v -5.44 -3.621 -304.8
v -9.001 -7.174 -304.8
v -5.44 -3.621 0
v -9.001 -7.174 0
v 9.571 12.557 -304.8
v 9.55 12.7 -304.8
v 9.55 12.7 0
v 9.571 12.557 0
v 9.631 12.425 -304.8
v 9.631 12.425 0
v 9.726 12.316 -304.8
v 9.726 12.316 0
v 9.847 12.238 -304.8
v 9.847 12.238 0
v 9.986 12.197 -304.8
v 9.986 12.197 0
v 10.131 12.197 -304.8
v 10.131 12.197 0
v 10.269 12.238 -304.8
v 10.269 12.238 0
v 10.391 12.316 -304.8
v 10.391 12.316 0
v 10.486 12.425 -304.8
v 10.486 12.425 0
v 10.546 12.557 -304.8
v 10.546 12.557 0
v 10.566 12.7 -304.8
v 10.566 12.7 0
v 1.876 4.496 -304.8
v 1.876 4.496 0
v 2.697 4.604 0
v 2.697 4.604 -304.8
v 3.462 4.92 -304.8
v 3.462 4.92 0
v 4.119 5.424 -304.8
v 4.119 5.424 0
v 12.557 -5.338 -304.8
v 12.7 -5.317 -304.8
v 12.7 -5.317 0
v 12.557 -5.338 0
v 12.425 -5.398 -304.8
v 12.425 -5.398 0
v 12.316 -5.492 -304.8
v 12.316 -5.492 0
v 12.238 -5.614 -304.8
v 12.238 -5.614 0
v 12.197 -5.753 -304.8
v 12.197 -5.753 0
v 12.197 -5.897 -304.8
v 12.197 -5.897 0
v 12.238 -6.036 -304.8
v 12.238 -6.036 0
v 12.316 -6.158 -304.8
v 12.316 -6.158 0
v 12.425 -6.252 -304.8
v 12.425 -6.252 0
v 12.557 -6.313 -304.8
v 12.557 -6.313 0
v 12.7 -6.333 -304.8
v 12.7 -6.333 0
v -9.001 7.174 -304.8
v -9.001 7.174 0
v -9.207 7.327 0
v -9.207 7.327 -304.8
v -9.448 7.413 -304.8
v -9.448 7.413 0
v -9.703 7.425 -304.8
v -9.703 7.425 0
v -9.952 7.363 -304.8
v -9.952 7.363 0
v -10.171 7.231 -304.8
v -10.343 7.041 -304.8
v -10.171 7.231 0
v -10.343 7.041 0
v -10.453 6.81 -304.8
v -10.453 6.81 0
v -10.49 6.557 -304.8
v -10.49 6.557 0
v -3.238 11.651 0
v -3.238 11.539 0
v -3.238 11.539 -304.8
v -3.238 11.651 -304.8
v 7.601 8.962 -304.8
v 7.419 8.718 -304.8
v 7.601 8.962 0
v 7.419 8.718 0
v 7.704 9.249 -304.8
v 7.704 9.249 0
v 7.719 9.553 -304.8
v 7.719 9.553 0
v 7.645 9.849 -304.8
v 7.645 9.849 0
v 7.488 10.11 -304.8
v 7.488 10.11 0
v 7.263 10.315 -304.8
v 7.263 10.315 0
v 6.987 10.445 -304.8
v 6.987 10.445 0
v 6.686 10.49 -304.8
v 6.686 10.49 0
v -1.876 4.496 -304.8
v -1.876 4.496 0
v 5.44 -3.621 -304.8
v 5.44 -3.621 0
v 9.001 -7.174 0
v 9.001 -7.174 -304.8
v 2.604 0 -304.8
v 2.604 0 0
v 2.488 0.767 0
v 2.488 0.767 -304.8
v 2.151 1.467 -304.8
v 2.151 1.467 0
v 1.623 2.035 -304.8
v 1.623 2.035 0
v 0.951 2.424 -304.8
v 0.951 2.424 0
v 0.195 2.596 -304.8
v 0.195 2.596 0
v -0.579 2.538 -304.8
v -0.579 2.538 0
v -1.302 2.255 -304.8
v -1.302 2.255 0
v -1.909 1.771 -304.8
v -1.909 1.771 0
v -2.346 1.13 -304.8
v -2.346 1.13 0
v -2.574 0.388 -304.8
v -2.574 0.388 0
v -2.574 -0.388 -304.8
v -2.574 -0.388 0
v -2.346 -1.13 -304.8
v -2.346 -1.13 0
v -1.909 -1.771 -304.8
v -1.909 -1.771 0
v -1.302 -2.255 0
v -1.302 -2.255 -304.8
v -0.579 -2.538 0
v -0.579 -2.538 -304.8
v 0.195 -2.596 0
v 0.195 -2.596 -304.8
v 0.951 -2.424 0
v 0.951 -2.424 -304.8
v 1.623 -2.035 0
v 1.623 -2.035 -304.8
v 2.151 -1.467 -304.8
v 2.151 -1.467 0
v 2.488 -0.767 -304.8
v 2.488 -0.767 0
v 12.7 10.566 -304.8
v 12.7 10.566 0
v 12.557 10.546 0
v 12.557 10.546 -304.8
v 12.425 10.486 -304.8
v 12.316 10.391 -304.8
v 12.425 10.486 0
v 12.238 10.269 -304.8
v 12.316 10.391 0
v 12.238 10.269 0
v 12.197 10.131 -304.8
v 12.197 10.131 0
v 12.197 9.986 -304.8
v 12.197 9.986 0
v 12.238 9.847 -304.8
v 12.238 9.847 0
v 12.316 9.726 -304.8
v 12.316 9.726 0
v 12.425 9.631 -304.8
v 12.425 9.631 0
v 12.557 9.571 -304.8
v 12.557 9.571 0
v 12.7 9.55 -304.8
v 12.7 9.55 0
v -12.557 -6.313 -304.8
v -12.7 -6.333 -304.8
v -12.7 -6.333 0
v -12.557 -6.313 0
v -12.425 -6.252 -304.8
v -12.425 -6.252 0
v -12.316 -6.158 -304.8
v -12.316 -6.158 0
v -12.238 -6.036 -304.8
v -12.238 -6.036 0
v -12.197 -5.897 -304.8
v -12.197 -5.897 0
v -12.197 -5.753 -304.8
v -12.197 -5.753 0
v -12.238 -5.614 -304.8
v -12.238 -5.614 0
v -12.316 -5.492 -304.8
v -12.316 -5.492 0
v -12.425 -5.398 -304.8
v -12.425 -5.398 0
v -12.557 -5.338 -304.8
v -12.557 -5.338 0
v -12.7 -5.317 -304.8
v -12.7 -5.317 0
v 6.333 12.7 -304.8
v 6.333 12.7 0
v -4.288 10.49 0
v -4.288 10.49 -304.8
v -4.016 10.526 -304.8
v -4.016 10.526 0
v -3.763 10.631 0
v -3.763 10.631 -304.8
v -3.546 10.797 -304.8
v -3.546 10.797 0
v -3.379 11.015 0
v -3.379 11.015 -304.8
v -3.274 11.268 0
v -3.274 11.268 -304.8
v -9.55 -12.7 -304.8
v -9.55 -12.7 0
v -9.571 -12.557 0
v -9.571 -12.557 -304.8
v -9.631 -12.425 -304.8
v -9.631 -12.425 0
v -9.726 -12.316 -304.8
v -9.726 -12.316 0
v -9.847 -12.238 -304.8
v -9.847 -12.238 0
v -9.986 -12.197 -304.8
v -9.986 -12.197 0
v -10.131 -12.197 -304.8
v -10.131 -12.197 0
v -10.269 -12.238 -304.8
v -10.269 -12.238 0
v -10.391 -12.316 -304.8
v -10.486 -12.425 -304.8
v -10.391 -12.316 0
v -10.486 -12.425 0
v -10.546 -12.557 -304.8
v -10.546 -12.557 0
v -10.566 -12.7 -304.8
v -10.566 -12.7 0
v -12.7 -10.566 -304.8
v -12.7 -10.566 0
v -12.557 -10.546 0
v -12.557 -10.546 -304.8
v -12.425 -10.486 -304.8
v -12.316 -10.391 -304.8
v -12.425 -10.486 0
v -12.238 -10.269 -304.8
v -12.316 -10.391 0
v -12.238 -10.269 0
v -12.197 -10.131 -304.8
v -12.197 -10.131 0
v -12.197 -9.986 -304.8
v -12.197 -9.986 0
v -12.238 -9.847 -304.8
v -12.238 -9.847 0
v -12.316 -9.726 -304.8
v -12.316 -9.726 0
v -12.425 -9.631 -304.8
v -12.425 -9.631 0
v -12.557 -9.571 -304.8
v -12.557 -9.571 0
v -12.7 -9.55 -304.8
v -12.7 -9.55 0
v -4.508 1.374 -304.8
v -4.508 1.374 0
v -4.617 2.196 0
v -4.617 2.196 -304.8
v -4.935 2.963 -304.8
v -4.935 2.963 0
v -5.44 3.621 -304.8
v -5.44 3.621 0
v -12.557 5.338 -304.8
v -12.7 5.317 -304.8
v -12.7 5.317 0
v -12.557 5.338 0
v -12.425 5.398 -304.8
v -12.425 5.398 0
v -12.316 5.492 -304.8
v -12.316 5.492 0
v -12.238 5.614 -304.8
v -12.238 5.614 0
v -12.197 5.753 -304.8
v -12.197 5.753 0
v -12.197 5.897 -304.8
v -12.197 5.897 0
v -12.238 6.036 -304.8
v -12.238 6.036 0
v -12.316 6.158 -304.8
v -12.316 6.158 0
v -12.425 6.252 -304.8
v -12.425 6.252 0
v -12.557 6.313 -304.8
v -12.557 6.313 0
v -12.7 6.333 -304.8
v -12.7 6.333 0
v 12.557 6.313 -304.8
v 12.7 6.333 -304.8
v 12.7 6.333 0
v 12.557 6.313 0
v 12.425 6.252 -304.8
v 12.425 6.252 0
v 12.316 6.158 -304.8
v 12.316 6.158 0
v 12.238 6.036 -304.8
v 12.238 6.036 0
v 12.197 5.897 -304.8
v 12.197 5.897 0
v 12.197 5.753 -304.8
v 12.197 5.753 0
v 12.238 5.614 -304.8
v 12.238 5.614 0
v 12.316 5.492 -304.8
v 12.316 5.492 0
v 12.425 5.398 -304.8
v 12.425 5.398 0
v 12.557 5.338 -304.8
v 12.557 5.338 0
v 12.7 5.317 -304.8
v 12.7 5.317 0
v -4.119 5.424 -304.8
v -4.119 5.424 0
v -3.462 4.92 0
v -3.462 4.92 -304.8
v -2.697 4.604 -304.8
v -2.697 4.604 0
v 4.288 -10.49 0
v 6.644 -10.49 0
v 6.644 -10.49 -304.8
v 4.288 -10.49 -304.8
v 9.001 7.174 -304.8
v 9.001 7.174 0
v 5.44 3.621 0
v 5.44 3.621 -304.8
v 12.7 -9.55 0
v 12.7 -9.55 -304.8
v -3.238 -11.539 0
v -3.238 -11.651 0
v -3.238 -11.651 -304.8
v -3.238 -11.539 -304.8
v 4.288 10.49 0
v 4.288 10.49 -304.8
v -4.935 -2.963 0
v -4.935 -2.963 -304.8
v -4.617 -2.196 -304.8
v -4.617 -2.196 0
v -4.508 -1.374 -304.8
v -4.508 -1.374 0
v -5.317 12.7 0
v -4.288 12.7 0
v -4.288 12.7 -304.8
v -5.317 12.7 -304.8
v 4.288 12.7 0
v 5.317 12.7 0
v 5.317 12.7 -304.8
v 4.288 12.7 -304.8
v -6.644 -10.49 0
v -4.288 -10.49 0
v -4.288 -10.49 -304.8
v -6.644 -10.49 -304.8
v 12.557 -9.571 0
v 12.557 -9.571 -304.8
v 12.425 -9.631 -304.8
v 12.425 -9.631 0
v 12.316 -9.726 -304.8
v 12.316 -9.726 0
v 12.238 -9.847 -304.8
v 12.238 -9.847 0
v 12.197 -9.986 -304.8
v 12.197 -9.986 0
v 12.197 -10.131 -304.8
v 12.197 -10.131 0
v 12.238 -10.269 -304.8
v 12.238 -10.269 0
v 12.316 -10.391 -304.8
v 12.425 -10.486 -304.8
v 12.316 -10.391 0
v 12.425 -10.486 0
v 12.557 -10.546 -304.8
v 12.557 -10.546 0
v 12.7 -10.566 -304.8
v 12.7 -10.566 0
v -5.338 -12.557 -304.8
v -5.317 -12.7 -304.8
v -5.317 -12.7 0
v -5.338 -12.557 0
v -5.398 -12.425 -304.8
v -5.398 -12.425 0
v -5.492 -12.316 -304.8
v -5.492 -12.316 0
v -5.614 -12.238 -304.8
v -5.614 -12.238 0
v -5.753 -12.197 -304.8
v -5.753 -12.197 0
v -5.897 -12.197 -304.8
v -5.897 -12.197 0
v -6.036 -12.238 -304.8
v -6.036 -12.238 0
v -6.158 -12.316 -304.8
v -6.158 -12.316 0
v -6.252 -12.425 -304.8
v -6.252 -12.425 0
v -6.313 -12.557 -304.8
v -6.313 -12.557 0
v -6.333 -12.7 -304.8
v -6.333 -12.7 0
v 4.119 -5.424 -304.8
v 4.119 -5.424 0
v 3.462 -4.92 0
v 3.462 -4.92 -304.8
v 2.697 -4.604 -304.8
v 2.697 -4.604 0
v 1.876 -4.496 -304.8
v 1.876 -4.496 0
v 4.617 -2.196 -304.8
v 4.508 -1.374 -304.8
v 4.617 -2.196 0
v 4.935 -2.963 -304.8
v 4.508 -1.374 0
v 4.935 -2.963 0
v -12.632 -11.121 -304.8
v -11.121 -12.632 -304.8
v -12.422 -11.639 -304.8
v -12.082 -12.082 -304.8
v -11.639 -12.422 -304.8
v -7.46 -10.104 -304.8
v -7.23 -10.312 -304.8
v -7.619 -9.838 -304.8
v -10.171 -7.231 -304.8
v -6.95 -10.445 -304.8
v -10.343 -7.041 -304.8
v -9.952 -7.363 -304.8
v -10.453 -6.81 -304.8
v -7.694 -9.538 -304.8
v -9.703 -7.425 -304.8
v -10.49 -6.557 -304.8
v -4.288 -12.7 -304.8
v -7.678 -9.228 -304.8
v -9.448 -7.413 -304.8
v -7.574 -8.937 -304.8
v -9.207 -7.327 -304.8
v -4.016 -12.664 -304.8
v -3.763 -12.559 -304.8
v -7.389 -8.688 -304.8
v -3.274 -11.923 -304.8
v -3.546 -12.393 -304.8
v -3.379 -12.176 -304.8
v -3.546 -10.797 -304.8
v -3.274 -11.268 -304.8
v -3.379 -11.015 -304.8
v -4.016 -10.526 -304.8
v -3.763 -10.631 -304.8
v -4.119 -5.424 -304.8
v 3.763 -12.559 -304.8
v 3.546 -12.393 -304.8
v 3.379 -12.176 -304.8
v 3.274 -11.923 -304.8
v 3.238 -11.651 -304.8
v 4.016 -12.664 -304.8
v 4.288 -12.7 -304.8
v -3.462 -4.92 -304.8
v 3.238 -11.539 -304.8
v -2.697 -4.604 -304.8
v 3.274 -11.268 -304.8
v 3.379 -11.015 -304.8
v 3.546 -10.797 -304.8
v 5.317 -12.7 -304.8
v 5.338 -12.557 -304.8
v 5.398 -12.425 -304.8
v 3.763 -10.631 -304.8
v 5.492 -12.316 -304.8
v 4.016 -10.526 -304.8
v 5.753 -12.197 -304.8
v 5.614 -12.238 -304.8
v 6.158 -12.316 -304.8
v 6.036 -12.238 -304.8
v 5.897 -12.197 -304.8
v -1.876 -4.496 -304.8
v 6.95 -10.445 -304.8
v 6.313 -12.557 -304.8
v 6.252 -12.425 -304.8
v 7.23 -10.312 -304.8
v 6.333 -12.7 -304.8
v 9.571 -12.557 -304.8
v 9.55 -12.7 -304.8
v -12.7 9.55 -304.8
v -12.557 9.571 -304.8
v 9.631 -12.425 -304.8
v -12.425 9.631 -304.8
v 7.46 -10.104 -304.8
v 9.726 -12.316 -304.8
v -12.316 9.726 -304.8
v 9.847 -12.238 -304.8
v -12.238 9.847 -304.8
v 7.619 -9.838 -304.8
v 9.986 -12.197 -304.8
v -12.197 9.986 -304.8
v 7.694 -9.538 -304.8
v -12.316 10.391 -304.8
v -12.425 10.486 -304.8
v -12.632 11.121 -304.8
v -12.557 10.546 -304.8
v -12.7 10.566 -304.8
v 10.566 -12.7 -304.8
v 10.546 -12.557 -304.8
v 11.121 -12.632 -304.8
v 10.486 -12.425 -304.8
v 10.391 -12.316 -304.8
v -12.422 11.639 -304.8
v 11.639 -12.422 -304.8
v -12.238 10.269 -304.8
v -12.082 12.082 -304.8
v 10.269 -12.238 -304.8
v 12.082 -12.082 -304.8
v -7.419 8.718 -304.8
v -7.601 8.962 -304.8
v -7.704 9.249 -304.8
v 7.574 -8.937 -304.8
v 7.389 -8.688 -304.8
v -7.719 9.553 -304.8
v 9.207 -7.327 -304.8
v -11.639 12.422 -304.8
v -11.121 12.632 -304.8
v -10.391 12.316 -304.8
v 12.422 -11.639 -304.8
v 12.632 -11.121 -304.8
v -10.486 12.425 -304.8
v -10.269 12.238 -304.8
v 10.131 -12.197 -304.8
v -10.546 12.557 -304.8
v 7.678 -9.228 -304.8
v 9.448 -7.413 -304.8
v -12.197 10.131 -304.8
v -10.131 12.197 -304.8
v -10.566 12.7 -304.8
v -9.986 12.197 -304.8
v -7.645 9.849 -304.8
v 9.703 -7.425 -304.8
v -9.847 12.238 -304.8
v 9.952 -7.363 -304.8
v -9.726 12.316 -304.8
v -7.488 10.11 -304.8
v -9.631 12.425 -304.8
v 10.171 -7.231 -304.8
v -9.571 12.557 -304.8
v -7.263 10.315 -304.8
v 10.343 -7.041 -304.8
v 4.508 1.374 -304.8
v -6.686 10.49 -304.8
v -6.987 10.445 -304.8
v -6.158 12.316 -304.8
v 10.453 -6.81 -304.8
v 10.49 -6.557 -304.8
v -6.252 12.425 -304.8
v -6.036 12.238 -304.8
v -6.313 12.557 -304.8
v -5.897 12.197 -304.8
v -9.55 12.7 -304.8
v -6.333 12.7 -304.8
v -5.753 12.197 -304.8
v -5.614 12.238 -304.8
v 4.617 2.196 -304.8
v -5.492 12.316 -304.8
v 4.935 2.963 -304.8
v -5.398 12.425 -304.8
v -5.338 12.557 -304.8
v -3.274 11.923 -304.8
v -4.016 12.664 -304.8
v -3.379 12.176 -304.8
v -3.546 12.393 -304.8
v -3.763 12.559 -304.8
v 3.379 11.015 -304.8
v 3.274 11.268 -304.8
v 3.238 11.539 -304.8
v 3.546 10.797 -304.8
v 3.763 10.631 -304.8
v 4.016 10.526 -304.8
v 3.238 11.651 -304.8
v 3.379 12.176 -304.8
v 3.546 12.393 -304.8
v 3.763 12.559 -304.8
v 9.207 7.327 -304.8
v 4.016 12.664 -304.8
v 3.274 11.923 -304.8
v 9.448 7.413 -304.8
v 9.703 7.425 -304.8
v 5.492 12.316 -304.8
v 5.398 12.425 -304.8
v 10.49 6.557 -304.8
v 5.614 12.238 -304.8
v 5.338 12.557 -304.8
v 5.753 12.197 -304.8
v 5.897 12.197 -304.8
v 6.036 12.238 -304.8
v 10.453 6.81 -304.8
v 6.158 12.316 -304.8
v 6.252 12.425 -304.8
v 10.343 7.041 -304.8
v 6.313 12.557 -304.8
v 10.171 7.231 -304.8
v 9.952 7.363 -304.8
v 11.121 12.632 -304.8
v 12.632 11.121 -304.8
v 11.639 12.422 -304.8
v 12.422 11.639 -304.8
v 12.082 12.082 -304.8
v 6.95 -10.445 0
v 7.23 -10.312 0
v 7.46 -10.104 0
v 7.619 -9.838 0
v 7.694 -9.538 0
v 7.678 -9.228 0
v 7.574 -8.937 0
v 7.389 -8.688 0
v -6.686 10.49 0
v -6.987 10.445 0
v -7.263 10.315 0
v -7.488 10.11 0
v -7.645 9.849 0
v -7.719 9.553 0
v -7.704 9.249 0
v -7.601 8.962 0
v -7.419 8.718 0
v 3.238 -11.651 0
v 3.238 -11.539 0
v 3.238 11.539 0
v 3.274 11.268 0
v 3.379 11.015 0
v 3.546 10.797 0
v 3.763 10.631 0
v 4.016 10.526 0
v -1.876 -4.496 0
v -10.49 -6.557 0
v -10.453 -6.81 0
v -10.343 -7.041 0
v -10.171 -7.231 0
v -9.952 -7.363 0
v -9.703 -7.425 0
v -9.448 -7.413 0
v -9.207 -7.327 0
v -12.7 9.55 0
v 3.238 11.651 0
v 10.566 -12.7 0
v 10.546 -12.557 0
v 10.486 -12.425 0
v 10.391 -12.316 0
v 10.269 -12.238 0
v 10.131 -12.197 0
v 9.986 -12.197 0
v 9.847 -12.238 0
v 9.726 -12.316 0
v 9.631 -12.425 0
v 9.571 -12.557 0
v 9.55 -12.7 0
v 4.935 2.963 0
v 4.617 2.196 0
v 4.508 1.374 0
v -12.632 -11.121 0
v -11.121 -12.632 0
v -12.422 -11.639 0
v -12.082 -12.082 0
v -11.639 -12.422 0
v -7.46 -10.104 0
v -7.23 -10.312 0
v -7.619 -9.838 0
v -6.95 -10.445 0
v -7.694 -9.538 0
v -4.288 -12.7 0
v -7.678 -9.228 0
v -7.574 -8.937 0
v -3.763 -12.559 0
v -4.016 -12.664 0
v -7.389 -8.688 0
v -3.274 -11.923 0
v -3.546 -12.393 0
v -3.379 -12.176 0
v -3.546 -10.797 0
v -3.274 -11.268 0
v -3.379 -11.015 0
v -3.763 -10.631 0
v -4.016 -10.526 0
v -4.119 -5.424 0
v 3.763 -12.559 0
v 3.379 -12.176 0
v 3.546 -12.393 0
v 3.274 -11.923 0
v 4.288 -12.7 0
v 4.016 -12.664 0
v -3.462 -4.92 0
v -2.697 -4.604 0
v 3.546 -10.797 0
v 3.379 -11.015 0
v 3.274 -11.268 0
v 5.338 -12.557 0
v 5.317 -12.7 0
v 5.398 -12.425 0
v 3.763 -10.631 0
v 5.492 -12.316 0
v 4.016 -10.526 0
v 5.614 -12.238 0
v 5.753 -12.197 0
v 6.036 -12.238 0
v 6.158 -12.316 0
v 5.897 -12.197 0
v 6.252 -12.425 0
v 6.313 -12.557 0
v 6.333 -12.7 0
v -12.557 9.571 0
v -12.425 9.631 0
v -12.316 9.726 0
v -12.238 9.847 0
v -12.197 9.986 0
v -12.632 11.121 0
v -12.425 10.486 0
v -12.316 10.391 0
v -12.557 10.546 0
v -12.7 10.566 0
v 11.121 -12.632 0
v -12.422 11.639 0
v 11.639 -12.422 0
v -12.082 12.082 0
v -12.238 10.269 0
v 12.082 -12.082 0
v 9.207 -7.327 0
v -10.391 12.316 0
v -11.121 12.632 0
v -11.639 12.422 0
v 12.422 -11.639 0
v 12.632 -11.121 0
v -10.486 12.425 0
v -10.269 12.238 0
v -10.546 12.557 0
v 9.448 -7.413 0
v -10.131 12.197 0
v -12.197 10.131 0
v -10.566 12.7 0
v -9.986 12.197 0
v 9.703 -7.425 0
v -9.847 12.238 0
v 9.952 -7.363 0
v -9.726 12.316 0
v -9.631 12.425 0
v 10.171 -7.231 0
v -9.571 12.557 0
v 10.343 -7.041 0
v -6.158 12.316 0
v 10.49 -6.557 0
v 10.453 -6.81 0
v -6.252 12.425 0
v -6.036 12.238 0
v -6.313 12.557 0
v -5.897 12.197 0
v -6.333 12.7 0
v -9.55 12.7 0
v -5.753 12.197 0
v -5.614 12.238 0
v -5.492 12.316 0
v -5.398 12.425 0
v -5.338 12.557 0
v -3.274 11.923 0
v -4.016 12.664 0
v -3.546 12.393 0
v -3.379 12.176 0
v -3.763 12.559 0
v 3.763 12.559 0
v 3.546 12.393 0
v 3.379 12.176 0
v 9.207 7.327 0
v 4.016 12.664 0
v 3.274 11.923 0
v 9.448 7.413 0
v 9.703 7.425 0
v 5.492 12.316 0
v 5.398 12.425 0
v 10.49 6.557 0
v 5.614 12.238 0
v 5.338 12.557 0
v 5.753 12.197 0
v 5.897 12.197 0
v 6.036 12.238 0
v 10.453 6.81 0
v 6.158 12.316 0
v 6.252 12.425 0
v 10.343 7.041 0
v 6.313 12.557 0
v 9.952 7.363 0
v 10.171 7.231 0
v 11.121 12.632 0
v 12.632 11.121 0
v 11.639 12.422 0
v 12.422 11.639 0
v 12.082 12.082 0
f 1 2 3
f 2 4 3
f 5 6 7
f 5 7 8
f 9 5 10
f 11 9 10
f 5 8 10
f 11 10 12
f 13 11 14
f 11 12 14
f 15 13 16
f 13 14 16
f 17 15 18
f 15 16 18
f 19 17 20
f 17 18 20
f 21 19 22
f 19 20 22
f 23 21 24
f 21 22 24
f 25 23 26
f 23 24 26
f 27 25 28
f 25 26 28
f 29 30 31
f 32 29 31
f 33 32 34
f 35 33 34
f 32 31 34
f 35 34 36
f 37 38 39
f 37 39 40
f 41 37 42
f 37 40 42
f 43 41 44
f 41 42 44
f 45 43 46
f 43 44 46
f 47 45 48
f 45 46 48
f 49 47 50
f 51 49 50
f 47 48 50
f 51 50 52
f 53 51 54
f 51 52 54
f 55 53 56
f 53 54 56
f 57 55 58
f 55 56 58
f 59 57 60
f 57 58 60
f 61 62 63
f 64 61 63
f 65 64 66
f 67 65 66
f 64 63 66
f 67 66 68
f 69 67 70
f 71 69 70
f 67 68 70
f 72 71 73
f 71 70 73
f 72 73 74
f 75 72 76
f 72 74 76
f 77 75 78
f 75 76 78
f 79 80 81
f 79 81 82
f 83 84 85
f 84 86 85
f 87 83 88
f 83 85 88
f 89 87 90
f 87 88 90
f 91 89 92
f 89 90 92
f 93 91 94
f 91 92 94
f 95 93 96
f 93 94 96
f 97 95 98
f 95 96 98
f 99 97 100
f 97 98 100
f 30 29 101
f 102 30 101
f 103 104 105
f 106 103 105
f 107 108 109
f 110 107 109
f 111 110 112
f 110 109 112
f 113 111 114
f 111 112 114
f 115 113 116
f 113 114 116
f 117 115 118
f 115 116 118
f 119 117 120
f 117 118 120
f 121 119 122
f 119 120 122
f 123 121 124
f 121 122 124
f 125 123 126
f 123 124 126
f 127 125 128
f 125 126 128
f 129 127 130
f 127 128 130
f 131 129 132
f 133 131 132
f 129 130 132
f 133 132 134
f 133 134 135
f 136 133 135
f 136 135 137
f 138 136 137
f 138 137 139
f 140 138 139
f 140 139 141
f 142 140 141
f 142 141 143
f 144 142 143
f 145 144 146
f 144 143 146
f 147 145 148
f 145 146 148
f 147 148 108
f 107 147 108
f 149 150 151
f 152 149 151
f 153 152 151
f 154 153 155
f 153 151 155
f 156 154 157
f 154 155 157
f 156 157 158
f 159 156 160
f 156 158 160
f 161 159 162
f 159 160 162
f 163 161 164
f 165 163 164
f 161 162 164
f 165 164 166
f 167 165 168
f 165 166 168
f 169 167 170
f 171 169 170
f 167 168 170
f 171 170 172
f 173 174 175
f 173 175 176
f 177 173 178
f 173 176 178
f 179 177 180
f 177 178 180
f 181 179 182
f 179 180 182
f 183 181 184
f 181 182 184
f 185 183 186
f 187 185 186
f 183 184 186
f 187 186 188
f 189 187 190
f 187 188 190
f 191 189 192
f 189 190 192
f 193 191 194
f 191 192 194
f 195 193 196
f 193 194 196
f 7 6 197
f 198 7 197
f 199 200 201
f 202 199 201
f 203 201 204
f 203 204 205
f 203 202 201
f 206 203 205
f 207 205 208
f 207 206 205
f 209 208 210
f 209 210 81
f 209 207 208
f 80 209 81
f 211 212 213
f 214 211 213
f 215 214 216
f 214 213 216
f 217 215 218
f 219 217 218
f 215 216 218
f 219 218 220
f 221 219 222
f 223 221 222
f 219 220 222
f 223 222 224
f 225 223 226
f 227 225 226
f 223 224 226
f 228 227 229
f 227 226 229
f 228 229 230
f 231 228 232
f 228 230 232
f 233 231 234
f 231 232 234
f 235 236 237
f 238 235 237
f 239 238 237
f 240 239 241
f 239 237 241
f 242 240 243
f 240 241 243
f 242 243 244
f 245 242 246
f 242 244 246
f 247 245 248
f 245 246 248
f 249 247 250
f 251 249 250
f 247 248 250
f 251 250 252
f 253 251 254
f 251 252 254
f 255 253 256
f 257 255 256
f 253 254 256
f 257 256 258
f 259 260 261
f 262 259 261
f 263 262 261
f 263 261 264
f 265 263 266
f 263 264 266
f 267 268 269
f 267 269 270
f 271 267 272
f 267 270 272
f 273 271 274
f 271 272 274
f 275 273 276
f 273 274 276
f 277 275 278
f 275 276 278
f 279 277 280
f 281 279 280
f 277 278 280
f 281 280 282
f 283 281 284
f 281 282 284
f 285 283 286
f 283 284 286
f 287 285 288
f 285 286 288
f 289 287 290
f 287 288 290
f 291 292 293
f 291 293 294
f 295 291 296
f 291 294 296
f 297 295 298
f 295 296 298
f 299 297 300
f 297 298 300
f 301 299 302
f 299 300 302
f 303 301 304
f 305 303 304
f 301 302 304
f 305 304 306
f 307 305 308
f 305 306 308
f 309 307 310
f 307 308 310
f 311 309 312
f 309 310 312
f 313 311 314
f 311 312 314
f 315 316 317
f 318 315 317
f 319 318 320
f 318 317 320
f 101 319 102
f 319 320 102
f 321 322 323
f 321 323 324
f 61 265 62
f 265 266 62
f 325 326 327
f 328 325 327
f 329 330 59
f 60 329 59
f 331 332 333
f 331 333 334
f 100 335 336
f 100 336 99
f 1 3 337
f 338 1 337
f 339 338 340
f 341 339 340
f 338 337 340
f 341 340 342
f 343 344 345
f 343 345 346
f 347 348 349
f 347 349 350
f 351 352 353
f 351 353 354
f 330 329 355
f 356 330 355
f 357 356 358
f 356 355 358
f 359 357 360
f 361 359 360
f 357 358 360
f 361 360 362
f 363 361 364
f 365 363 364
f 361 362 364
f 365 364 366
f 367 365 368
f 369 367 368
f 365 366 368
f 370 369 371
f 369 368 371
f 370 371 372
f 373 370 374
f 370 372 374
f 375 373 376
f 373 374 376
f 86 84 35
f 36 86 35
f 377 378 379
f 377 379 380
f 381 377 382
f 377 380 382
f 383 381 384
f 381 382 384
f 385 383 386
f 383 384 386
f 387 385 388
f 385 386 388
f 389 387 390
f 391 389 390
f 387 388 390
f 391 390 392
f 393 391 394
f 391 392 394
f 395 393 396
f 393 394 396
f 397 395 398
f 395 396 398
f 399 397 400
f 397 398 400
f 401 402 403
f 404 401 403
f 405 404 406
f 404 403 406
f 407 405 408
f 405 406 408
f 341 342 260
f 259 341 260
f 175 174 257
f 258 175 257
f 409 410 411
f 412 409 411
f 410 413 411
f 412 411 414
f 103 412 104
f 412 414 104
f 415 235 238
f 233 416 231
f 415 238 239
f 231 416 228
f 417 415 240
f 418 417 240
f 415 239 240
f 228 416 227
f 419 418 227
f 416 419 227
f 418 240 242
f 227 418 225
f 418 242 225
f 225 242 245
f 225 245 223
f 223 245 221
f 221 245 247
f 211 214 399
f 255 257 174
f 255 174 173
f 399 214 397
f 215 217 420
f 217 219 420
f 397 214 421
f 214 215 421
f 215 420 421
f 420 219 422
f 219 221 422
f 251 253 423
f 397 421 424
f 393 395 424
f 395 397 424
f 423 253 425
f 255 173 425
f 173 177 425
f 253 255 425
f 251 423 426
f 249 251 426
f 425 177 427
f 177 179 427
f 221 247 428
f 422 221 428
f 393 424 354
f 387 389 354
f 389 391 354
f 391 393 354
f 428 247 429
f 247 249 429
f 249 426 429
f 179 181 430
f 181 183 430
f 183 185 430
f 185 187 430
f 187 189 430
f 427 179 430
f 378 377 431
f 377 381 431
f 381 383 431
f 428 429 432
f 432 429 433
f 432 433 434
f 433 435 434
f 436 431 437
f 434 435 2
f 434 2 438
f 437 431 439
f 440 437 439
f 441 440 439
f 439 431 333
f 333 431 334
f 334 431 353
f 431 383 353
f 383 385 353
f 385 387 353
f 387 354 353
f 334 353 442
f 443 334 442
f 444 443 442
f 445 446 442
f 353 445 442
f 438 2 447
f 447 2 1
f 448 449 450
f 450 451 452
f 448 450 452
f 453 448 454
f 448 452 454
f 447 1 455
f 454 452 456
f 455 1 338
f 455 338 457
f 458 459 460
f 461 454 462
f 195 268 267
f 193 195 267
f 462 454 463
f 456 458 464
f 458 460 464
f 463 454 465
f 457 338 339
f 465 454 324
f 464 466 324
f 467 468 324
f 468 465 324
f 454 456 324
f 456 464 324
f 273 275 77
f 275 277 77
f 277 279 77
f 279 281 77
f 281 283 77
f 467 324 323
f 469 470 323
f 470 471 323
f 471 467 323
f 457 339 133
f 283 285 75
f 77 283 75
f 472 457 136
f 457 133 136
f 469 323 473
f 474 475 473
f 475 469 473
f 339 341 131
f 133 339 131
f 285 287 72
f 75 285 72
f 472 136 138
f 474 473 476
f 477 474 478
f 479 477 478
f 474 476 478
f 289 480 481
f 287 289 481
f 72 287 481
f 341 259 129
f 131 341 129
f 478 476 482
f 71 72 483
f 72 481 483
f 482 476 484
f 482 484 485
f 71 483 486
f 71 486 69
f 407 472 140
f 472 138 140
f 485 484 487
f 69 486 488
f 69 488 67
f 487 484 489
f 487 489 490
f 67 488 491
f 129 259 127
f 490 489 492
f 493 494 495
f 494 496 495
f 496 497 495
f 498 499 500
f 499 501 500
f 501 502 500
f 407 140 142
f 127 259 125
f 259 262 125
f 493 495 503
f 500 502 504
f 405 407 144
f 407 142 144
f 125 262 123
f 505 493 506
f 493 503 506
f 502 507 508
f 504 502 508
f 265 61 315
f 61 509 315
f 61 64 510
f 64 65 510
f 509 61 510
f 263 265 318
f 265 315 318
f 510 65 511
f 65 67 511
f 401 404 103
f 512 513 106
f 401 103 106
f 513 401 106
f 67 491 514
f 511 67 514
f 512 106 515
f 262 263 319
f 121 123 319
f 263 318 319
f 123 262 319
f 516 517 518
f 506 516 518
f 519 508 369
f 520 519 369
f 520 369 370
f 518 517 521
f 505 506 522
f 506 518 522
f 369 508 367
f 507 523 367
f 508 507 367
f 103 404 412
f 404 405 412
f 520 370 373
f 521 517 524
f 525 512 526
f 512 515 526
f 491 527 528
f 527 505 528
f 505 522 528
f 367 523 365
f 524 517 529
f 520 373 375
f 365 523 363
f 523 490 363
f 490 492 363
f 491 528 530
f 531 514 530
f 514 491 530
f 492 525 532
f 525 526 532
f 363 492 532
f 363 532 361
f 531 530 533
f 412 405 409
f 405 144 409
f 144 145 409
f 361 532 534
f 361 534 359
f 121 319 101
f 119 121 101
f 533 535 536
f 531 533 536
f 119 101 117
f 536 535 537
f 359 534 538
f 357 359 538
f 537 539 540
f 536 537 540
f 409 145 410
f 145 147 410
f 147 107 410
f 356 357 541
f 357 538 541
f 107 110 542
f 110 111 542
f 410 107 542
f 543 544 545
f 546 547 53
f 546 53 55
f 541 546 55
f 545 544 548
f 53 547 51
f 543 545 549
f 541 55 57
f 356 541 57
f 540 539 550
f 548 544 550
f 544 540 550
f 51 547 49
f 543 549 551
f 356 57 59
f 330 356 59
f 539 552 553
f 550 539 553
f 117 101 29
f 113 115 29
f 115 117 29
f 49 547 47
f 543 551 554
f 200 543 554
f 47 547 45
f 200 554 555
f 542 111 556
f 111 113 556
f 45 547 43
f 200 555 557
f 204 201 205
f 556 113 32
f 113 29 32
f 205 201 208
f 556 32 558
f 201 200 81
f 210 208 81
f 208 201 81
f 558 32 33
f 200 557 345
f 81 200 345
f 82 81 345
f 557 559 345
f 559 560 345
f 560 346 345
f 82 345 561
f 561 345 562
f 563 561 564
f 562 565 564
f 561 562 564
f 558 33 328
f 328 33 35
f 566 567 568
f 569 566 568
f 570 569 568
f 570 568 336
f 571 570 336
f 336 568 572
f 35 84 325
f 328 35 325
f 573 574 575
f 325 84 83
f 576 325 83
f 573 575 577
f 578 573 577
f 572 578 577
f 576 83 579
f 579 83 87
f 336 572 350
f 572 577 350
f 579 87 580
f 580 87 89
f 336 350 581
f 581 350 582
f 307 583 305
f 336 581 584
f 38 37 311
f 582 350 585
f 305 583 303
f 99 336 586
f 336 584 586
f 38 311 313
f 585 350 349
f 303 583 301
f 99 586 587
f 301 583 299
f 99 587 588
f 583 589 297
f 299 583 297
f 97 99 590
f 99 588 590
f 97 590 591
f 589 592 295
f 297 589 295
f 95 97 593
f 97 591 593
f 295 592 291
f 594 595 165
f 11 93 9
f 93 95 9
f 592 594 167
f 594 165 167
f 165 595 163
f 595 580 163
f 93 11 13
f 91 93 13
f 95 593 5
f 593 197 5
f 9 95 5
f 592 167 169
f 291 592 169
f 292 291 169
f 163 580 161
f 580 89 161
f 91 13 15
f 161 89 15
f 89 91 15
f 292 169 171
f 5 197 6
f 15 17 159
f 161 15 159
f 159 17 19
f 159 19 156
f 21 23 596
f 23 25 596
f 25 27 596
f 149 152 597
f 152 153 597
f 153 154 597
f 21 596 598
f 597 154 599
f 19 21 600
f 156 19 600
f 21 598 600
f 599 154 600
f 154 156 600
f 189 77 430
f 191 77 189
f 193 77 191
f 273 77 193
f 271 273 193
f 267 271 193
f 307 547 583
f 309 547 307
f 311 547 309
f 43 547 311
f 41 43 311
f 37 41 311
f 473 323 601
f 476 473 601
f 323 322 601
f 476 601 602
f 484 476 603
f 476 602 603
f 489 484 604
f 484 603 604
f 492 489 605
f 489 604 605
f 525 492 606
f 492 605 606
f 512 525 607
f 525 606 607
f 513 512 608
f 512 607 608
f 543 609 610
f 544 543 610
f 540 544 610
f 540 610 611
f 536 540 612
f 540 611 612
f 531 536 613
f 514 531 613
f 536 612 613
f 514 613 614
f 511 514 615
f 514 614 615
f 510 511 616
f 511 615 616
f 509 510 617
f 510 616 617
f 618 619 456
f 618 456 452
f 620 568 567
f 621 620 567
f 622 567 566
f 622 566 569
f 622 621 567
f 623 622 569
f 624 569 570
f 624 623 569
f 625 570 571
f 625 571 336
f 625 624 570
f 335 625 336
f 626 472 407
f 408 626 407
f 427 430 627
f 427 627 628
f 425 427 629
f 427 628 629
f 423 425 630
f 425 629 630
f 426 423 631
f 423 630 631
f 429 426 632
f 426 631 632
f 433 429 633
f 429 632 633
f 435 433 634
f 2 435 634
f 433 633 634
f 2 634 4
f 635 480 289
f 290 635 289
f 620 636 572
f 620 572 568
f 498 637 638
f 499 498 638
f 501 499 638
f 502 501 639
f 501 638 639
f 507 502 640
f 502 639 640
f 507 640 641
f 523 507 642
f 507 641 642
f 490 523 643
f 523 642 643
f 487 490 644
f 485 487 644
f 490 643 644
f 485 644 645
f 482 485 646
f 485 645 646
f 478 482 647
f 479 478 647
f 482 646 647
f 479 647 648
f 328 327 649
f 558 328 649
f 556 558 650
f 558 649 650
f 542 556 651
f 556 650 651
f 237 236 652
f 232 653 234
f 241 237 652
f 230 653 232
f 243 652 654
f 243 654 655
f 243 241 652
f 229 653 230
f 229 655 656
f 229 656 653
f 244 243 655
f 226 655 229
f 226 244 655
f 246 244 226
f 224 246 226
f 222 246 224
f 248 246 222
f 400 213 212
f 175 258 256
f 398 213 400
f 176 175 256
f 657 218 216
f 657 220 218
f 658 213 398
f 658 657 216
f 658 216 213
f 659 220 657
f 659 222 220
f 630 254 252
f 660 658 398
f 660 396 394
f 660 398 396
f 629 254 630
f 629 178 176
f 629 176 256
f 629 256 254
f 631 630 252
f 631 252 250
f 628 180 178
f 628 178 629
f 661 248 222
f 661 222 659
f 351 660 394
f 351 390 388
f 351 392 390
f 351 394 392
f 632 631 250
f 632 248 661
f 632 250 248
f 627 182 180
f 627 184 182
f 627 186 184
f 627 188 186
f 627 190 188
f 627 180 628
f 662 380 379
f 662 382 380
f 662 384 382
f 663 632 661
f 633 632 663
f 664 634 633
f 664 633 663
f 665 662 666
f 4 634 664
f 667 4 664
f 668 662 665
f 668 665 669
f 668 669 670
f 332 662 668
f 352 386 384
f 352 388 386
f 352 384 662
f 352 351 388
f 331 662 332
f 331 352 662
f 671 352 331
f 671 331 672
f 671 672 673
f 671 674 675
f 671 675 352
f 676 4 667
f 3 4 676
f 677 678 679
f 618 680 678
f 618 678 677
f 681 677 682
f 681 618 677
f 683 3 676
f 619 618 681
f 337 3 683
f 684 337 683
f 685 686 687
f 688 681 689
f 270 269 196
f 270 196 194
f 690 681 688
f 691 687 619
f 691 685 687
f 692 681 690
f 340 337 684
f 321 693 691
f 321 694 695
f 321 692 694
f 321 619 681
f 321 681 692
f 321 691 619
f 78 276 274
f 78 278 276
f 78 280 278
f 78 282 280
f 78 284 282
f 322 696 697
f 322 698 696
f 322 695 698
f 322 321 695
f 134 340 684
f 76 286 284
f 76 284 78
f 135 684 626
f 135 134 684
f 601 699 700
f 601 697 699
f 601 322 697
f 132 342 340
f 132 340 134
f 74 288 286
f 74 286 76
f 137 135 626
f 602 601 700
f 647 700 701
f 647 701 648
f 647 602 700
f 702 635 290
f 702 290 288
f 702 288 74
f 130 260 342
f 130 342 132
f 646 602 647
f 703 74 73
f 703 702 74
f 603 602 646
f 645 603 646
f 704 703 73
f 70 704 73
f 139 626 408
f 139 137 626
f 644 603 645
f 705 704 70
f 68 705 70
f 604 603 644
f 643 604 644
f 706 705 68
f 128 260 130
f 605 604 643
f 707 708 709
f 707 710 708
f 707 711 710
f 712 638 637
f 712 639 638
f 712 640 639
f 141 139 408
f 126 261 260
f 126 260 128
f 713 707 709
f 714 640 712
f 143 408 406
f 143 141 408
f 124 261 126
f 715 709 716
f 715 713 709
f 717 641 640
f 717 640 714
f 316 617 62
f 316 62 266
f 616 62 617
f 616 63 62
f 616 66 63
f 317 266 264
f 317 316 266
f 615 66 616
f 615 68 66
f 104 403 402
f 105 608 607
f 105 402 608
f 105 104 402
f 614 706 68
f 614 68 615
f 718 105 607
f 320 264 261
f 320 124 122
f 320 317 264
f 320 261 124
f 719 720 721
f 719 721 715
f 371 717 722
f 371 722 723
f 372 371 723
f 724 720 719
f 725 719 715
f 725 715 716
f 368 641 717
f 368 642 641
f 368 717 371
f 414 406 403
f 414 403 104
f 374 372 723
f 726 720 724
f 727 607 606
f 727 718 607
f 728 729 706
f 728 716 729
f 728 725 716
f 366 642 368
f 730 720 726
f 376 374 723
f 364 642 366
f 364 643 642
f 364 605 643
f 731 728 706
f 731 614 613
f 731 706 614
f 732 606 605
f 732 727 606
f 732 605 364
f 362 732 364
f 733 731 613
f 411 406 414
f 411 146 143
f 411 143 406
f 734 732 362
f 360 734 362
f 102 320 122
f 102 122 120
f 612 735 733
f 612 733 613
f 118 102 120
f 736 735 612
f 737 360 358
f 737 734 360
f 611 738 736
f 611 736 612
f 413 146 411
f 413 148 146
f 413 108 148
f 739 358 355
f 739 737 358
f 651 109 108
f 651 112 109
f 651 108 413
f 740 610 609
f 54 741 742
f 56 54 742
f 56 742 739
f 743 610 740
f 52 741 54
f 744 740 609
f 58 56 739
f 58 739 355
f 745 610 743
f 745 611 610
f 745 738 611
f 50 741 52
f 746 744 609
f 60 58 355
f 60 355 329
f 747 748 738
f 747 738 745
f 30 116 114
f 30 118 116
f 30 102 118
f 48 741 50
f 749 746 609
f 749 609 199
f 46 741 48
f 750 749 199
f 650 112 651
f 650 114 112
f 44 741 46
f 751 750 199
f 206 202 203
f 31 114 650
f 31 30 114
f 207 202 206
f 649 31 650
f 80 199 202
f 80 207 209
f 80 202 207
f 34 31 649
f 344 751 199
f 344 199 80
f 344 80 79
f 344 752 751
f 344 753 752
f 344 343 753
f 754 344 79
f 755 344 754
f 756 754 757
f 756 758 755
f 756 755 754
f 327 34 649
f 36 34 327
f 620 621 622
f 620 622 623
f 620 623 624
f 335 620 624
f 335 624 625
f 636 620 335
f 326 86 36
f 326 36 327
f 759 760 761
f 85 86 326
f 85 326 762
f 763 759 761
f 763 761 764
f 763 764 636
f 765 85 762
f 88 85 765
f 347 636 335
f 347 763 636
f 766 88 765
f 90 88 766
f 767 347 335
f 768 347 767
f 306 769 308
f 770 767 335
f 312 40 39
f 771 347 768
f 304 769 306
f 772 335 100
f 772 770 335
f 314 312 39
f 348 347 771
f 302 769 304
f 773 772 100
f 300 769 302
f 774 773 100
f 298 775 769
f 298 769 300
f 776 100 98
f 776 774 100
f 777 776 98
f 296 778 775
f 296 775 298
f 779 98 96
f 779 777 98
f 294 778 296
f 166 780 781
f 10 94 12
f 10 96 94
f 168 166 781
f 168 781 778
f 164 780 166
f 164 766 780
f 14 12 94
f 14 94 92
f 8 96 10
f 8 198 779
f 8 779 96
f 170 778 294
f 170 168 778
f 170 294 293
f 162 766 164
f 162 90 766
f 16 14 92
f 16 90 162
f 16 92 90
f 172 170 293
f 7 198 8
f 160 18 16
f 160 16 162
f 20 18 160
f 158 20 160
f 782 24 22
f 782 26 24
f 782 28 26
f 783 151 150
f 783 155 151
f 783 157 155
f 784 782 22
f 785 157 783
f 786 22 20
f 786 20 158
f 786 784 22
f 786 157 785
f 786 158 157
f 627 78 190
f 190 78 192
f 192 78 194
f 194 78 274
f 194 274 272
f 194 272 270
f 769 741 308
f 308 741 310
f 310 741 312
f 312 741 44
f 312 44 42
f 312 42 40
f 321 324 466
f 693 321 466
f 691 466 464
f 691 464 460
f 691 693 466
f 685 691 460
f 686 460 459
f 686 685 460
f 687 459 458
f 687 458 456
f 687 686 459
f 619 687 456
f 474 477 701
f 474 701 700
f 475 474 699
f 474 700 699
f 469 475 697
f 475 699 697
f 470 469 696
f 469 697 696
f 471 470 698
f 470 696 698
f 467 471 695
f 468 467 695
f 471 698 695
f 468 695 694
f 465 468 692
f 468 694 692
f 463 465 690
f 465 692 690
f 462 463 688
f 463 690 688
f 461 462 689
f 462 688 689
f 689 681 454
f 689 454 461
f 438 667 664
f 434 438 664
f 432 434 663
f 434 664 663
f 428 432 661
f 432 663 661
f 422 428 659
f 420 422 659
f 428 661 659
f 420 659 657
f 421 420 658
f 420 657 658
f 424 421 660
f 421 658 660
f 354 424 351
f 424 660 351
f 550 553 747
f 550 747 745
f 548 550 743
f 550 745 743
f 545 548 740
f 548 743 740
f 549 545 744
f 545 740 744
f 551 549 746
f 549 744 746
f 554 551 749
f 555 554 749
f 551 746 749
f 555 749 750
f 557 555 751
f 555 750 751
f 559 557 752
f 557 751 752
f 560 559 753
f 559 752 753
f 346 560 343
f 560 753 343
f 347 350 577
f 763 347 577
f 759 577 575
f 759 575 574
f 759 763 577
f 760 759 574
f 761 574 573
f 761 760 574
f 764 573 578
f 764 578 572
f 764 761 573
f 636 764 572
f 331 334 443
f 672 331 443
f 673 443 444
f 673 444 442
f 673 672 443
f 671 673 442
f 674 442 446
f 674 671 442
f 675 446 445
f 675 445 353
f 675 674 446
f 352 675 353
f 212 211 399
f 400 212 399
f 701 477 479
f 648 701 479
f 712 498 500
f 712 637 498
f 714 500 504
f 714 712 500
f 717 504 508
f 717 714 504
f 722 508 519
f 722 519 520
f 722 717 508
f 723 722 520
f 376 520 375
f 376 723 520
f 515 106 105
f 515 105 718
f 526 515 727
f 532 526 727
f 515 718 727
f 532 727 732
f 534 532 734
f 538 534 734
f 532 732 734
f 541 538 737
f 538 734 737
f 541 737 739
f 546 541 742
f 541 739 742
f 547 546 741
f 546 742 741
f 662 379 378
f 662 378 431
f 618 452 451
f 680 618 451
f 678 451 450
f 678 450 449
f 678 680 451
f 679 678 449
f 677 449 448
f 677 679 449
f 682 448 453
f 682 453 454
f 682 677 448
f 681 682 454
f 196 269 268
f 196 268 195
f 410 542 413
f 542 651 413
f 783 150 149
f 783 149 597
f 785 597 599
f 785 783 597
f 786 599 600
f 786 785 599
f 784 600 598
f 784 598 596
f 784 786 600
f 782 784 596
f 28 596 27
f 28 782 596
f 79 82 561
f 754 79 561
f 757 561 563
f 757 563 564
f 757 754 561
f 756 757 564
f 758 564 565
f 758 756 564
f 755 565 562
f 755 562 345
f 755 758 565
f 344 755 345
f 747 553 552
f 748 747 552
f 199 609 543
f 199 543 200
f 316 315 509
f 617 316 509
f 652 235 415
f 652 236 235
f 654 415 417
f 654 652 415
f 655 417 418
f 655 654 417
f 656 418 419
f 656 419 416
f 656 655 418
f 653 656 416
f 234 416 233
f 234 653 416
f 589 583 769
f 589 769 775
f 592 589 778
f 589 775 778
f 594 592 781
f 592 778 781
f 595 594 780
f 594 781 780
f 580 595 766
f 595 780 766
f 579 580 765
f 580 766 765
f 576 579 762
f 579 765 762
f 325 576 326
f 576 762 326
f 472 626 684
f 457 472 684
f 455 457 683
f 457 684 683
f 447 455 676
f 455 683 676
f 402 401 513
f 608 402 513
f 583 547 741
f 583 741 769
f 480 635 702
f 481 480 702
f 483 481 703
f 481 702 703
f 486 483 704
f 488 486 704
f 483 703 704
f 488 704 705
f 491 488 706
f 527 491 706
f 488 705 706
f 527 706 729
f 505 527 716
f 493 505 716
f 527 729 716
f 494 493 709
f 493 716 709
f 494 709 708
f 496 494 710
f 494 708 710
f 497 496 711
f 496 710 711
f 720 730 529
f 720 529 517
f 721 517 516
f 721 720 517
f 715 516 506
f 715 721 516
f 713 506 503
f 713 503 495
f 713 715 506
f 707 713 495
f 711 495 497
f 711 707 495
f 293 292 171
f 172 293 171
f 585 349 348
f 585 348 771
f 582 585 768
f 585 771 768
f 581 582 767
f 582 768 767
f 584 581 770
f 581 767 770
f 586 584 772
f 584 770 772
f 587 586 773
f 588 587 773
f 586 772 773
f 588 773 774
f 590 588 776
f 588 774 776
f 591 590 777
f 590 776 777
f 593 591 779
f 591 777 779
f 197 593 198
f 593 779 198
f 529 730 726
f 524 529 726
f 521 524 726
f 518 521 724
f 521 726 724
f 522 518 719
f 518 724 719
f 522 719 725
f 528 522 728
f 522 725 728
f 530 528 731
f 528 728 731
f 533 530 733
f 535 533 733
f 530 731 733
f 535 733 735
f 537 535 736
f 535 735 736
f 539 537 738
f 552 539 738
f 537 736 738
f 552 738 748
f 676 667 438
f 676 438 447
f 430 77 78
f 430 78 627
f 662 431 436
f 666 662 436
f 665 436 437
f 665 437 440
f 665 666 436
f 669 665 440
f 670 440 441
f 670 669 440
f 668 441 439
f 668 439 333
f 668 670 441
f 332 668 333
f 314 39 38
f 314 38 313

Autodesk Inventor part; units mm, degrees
ref_plane "YZ Plane" through (0, 0, 0) normal (1, 0, 0) x (0, 1, 0)
ref_plane "XZ Plane" through (0, 0, 0) normal (0, 1, 0) x (-1, 0, 0)
ref_plane "XY Plane" through (0, 0, 0) normal (0, 0, 1) x (1, 0, 0)
sketch "Sketch1" plane through (0, 0, 0) normal (0, 0, 1) x (1, 0, 0)
  arc A0 (5.4405, 3.6206) -> (4.5085, 1.3735) centre (7.6835, 1.3735) ccw
  line L0 (9.0008, 7.1744) -> (5.4405, 3.6206)
  arc A1 (10.4902, 6.5567) -> (9.0008, 7.1744) centre (9.6174, 6.5567) ccw
  line L1 (10.4902, -6.5567) -> (10.4902, 6.5567)
  arc A2 (9.0008, -7.1744) -> (10.4902, -6.5567) centre (9.6174, -6.5567) ccw
  line L2 (5.4405, -3.6206) -> (9.0008, -7.1744)
  arc A3 (4.5085, -1.3735) -> (5.4405, -3.6206) centre (7.6835, -1.3735) ccw
  line L3 (4.5085, 1.3735) -> (4.5085, -1.3735)
  circle A4 centre (0, 0) radius 2.6035
  arc A5 (-9.0008, 7.1744) -> (-10.4902, 6.5567) centre (-9.6174, 6.5567) ccw
  line L4 (-5.4405, 3.6206) -> (-9.0008, 7.1744)
  arc A6 (-4.5085, 1.3735) -> (-5.4405, 3.6206) centre (-7.6835, 1.3735) ccw
  line L5 (-4.5085, -1.3735) -> (-4.5085, 1.3735)
  arc A7 (-5.4405, -3.6206) -> (-4.5085, -1.3735) centre (-7.6835, -1.3735) ccw
  line L6 (-9.0008, -7.1744) -> (-5.4405, -3.6206)
  arc A8 (-10.4902, -6.5567) -> (-9.0008, -7.1744) centre (-9.6174, -6.5567) ccw
  line L7 (-10.4902, 6.5567) -> (-10.4902, -6.5567)
  arc A9 (-7.3891, -8.6879) -> (-6.6435, -10.4902) centre (-6.6435, -9.4348) ccw
  line L8 (-7.3891, -8.6879) -> (-4.1189, -5.4237)
  arc A10 (-1.8759, -4.4958) -> (-4.1189, -5.4237) centre (-1.8759, -7.6708) ccw
  line L9 (-1.8759, -4.4958) -> (1.8759, -4.4958)
  arc A11 (4.1189, -5.4237) -> (1.8759, -4.4958) centre (1.8759, -7.6708) ccw
  line L10 (4.1189, -5.4237) -> (7.3891, -8.6879)
  arc A12 (6.6435, -10.4902) -> (7.3891, -8.6879) centre (6.6435, -9.4348) ccw
  line L11 (6.6435, -10.4902) -> (4.2875, -10.4902)
  arc A13 (4.2875, -10.4902) -> (3.2385, -11.5392) centre (4.2875, -11.5392) ccw
  line L12 (3.2385, -11.5392) -> (3.2385, -11.651)
  arc A14 (3.2385, -11.651) -> (4.2875, -12.7) centre (4.2875, -11.651) ccw
  line L13 (4.2875, -12.7) -> (5.3171, -12.7)
  arc A15 (6.3331, -12.7) -> (5.3171, -12.7) centre (5.8251, -12.7) ccw
  line L14 (6.3331, -12.7) -> (9.5504, -12.7)
  arc A16 (10.5664, -12.6998) -> (9.5504, -12.7) centre (10.0584, -12.7) ccw
  arc A17 (10.5664, -12.6998) -> (12.6998, -10.5664) centre (10.5918, -10.5918) ccw
  arc A18 (12.7, -9.5504) -> (12.6998, -10.5664) centre (12.7, -10.0584) ccw
  line L15 (12.7, -9.5504) -> (12.7, -6.3331)
  arc A19 (12.7, -5.3171) -> (12.7, -6.3331) centre (12.7, -5.8251) ccw
  line L16 (12.7, -5.3171) -> (12.7, 5.3171)
  arc A20 (12.7, 6.3331) -> (12.7, 5.3171) centre (12.7, 5.8251) ccw
  line L17 (12.7, 6.3331) -> (12.7, 9.5504)
  arc A21 (12.6998, 10.5664) -> (12.7, 9.5504) centre (12.7, 10.0584) ccw
  arc A22 (12.6998, 10.5664) -> (10.5664, 12.6998) centre (10.5918, 10.5918) ccw
  arc A23 (9.5504, 12.7) -> (10.5664, 12.6998) centre (10.0584, 12.7) ccw
  line L18 (9.5504, 12.7) -> (6.3331, 12.7)
  arc A24 (5.3171, 12.7) -> (6.3331, 12.7) centre (5.8251, 12.7) ccw
  line L19 (5.3171, 12.7) -> (4.2875, 12.7)
  arc A25 (4.2875, 12.7) -> (3.2385, 11.651) centre (4.2875, 11.651) ccw
  line L20 (3.2385, 11.651) -> (3.2385, 11.5392)
  arc A26 (3.2385, 11.5392) -> (4.2875, 10.4902) centre (4.2875, 11.5392) ccw
  line L21 (4.2875, 10.4902) -> (6.6858, 10.4902)
  arc A27 (7.419, 8.7178) -> (6.6858, 10.4902) centre (6.6858, 9.4523) ccw
  line L22 (7.419, 8.7178) -> (4.1189, 5.4237)
  arc A28 (1.8759, 4.4958) -> (4.1189, 5.4237) centre (1.8759, 7.6708) ccw
  line L23 (1.8759, 4.4958) -> (-1.8759, 4.4958)
  arc A29 (-4.1189, 5.4237) -> (-1.8759, 4.4958) centre (-1.8759, 7.6708) ccw
  line L24 (-4.1189, 5.4237) -> (-7.419, 8.7178)
  arc A30 (-6.6858, 10.4902) -> (-7.419, 8.7178) centre (-6.6858, 9.4523) ccw
  line L25 (-6.6858, 10.4902) -> (-4.2875, 10.4902)
  arc A31 (-4.2875, 10.4902) -> (-3.2385, 11.5392) centre (-4.2875, 11.5392) ccw
  line L26 (-3.2385, 11.5392) -> (-3.2385, 11.651)
  arc A32 (-3.2385, 11.651) -> (-4.2875, 12.7) centre (-4.2875, 11.651) ccw
  line L27 (-4.2875, 12.7) -> (-5.3171, 12.7)
  arc A33 (-6.3331, 12.7) -> (-5.3171, 12.7) centre (-5.8251, 12.7) ccw
  line L28 (-6.3331, 12.7) -> (-9.5504, 12.7)
  arc A34 (-10.5664, 12.6998) -> (-9.5504, 12.7) centre (-10.0584, 12.7) ccw
  arc A35 (-10.5664, 12.6998) -> (-12.6998, 10.5664) centre (-10.5918, 10.5918) ccw
  arc A36 (-12.7, 9.5504) -> (-12.6998, 10.5664) centre (-12.7, 10.0584) ccw
  line L29 (-12.7, 9.5504) -> (-12.7, 6.3331)
  arc A37 (-12.7, 5.3171) -> (-12.7, 6.3331) centre (-12.7, 5.8251) ccw
  line L30 (-12.7, 5.3171) -> (-12.7, -5.3171)
  arc A38 (-12.7, -6.3331) -> (-12.7, -5.3171) centre (-12.7, -5.8251) ccw
  line L31 (-12.7, -6.3331) -> (-12.7, -9.5504)
  arc A39 (-12.6998, -10.5664) -> (-12.7, -9.5504) centre (-12.7, -10.0584) ccw
  arc A40 (-12.6998, -10.5664) -> (-10.5664, -12.6998) centre (-10.5918, -10.5918) ccw
  arc A41 (-9.5504, -12.7) -> (-10.5664, -12.6998) centre (-10.0584, -12.7) ccw
  line L32 (-9.5504, -12.7) -> (-6.3331, -12.7)
  arc A42 (-5.3171, -12.7) -> (-6.3331, -12.7) centre (-5.8251, -12.7) ccw
  line L33 (-5.3171, -12.7) -> (-4.2875, -12.7)
  arc A43 (-4.2875, -12.7) -> (-3.2385, -11.651) centre (-4.2875, -11.651) ccw
  line L34 (-3.2385, -11.651) -> (-3.2385, -11.5392)
  arc A44 (-3.2385, -11.5392) -> (-4.2875, -10.4902) centre (-4.2875, -11.5392) ccw
  line L35 (-4.2875, -10.4902) -> (-6.6435, -10.4902)
extrude "Extrusion1" add sketch "Sketch1" against normal blind 304.8
properties part number "1004"
